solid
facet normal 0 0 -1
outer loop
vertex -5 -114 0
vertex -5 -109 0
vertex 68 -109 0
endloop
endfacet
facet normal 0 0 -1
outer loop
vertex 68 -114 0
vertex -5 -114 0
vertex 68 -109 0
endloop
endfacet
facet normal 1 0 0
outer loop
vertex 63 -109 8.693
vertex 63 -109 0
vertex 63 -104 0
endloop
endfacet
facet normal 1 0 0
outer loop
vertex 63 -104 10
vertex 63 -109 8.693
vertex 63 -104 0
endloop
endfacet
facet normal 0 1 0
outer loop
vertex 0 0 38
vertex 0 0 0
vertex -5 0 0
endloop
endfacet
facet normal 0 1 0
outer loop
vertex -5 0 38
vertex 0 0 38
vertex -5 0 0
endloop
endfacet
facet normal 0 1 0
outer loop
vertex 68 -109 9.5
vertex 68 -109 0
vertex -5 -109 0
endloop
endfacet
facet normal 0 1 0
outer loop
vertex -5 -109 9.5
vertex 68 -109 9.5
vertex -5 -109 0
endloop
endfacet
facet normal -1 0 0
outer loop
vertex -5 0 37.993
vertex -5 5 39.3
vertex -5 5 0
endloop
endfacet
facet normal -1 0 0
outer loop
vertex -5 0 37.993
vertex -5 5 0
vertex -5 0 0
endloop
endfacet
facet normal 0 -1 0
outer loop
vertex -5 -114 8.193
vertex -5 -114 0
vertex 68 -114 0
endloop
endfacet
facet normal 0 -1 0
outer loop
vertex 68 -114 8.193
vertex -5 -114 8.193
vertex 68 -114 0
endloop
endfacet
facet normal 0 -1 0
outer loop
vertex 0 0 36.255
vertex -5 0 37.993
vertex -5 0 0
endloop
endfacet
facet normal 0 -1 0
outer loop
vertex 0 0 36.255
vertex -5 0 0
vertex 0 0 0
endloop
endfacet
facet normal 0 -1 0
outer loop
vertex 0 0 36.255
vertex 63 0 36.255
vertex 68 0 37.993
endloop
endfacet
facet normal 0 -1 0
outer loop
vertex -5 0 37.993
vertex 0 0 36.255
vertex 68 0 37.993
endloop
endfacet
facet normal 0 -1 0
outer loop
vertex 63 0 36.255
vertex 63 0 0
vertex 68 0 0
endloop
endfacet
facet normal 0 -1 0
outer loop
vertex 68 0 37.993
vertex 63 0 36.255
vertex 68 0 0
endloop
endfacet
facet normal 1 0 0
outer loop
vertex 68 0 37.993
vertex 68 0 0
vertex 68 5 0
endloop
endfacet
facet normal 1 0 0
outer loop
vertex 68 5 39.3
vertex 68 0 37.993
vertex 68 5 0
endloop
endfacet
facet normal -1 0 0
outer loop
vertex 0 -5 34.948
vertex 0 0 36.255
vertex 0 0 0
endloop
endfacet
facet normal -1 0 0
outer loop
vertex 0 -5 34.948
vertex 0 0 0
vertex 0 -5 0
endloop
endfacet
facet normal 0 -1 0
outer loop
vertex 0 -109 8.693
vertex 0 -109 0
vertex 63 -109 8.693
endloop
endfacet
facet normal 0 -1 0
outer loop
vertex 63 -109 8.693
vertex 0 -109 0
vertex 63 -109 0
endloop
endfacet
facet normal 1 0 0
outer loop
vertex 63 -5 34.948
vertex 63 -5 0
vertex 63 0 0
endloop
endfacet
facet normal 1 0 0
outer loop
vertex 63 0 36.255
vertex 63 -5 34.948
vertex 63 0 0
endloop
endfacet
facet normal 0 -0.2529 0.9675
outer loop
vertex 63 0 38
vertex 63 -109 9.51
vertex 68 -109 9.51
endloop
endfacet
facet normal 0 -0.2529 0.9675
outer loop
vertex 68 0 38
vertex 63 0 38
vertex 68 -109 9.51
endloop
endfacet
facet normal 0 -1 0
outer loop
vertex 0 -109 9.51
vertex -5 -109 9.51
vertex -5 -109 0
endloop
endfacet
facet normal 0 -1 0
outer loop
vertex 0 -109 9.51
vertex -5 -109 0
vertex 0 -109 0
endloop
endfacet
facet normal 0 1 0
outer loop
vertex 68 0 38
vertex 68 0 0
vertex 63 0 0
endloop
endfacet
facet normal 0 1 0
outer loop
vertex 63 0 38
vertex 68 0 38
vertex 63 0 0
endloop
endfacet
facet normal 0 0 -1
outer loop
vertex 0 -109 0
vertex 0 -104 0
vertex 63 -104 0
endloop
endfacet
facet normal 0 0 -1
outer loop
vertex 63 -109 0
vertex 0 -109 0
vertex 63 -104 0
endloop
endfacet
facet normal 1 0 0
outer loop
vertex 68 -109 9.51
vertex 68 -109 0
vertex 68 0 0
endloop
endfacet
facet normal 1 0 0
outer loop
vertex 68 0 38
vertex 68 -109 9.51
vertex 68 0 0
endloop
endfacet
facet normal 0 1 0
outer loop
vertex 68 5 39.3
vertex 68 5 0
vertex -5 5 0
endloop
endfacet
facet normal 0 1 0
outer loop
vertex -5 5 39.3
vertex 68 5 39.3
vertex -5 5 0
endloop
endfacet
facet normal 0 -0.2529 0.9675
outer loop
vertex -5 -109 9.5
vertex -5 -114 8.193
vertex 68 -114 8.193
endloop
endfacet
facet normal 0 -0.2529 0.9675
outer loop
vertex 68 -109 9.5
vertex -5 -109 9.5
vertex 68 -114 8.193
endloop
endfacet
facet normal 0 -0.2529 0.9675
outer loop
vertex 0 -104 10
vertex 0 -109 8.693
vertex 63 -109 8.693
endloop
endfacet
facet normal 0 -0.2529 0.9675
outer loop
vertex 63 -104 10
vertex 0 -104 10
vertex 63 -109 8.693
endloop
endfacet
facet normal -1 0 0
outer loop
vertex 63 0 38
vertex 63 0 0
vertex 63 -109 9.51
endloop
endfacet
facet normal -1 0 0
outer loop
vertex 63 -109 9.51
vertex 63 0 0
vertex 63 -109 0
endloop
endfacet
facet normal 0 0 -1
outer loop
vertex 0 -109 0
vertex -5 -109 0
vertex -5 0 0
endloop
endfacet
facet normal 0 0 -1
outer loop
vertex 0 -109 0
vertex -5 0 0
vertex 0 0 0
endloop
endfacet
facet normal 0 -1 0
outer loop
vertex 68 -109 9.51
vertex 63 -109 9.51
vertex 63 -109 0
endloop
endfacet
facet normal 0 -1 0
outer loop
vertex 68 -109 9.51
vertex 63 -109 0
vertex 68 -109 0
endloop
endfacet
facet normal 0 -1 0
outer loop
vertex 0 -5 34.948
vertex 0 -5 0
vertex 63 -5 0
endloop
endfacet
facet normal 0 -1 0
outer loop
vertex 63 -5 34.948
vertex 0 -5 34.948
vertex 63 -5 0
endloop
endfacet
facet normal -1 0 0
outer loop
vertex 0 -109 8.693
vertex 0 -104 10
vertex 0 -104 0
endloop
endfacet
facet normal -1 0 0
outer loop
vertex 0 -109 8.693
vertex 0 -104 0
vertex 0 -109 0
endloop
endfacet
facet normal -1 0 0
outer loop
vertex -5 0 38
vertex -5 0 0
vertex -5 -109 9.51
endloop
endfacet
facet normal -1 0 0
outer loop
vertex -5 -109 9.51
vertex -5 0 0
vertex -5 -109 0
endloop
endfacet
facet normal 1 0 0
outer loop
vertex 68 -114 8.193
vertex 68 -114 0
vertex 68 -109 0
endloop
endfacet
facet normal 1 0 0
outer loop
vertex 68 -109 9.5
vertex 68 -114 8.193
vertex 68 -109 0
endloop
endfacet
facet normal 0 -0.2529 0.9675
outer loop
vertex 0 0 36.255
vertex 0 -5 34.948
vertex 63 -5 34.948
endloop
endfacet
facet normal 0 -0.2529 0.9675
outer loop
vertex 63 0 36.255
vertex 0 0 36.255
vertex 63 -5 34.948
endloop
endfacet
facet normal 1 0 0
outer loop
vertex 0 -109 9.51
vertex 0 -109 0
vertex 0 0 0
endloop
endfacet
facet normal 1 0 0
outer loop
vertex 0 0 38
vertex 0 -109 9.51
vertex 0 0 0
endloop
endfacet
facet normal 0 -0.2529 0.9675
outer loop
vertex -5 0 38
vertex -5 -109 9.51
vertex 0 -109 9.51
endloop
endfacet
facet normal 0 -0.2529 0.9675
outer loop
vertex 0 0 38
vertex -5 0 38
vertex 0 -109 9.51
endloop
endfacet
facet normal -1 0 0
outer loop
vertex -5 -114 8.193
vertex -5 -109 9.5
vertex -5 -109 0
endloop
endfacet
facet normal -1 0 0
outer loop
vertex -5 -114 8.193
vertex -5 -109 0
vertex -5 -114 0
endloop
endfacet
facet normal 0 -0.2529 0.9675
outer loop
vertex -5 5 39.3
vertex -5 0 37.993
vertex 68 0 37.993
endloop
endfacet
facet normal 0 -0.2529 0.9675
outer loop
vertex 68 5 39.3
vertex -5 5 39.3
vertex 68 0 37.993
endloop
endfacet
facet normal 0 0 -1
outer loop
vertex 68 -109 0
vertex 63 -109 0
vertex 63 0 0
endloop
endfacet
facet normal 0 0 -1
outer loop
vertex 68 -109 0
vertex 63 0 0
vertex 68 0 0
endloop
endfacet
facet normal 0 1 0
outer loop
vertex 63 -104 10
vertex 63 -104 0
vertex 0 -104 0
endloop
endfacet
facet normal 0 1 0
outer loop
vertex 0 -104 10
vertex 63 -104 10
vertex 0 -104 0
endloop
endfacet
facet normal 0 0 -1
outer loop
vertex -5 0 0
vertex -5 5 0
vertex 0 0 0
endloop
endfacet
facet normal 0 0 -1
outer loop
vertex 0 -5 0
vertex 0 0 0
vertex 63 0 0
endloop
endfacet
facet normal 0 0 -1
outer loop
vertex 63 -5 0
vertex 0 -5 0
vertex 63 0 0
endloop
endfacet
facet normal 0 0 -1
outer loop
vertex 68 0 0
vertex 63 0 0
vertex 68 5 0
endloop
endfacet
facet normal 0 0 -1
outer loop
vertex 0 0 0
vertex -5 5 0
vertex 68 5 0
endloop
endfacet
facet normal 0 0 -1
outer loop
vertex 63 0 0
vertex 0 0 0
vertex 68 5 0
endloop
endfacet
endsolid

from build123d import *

# Parameters (mm, degrees)
F1_DEPTH   = 36.255
F2_DEPTH   = 39.3
F3_DEPTH   = 9.5
F4_DEPTH   = 10
F5_DEPTH   = 38
F6_SIZE2   = 28.489896
F6_SIZE    = 108.99999
F7_SIZE2   = 1.306866
F7_SIZE    = 4.99999
F7_2_SIZE2 = 1.306866
F7_2_SIZE  = 4.99999
F8_SIZE2   = 1.306866
F8_SIZE    = 4.99999
F8_2_SIZE2 = 1.306866
F8_2_SIZE  = 4.99999
F9_SIZE2   = 28.489896
F9_SIZE    = 108.99999


# Not quite as in the source:
# - a fillet or chamfer is up to 0.001 mm smaller than in the source, because OpenCascade refuses the exact size


with BuildPart() as f1:
    # F0 (on Top) → F1 (new body)
    with BuildSketch(Plane.XY):
        Polygon((63, -5), (63, 0), (0, 0), (0, -5), (5, -5), (58, -5), align=None)
    extrude(amount=F1_DEPTH)

    # F0 (on Top) → F2 (join)
    with BuildSketch(Plane.XY):
        Polygon((0, 0), (63, 0), (68, 0), (68, 5), (-5, 5), (-5, 0), align=None)
    extrude(amount=F2_DEPTH)

    # F7#2 (size 5 and 1.3068764239 in the source; OpenCascade refuses exactly that, so slightly less here)
    f7_2_edges = [f1.edges().sort_by_distance(p)[0] for p in [
        (31.5, 0, 39.3),
    ]]
    f7_2_side = f1.faces().sort_by_distance((31.5, 2.5, 39.3))[0]
    chamfer(f7_2_edges, length=F7_2_SIZE, length2=F7_2_SIZE2, reference=f7_2_side)

    # F8 (size 5 and 1.3068764239 in the source; OpenCascade refuses exactly that, so slightly less here)
    f8_edges = [f1.edges().sort_by_distance(p)[0] for p in [
        (31.5, -5, 36.255),
    ]]
    f8_side = f1.faces().sort_by_distance((31.5, -2.5, 36.255))[0]
    chamfer(f8_edges, length=F8_SIZE, length2=F8_SIZE2, reference=f8_side)


with BuildPart() as f3:
    # F0 (on Top) → F3 (new body)
    with BuildSketch(Plane.XY):
        Polygon((68, -114), (68, -109), (63, -109), (0, -109), (-5, -109), (-5, -114), align=None)
    extrude(amount=F3_DEPTH)

    # F7 (size 5 and 1.3068764239 in the source; OpenCascade refuses exactly that, so slightly less here)
    f7_edges = [f3.edges().sort_by_distance(p)[0] for p in [
        (31.5, -114, 9.5),
    ]]
    f7_side = f3.faces().sort_by_distance((31.5, -111.5, 9.5))[0]
    chamfer(f7_edges, length=F7_SIZE, length2=F7_SIZE2, reference=f7_side)


with BuildPart() as f4:
    # F0 (on Top) → F4 (new body)
    with BuildSketch(Plane.XY):
        Polygon((63, -109), (63, -104), (58, -104), (5, -104), (0, -104), (0, -109), align=None)
    extrude(amount=F4_DEPTH)

    # F8#2 (size 5 and 1.3068764239 in the source; OpenCascade refuses exactly that, so slightly less here)
    f8_2_edges = [f4.edges().sort_by_distance(p)[0] for p in [
        (31.5, -109, 10),
    ]]
    f8_2_side = f4.faces().sort_by_distance((31.5, -106.5, 10))[0]
    chamfer(f8_2_edges, length=F8_2_SIZE, length2=F8_2_SIZE2, reference=f8_2_side)


with BuildPart() as f5:
    # F0 (on Top) → F5 (new body)
    with BuildSketch(Plane.XY):
        Polygon((68, 0), (63, 0), (63, -5), (63, -104), (63, -109), (68, -109), align=None)
    extrude(amount=F5_DEPTH)

    # F6 (size 109 and 28.4899060414 in the source; OpenCascade refuses exactly that, so slightly less here)
    f6_edges = [f5.edges().sort_by_distance(p)[0] for p in [
        (65.5, -109, 38),
    ]]
    f6_side = f5.faces().sort_by_distance((65.5, -54.5, 38))[0]
    chamfer(f6_edges, length=F6_SIZE, length2=F6_SIZE2, reference=f6_side)


with BuildPart() as f5b:
    # F0 (on Top) → F5, piece 2 (new body)
    with BuildSketch(Plane.XY):
        Polygon((0, -5), (0, 0), (-5, 0), (-5, -109), (0, -109), (0, -104), align=None)
    extrude(amount=F5_DEPTH)

    # F9 (size 109 and 28.4899060414 in the source; OpenCascade refuses exactly that, so slightly less here)
    f9_edges = [f5b.edges().sort_by_distance(p)[0] for p in [
        (-2.5, -109, 38),
    ]]
    f9_side = f5b.faces().sort_by_distance((-2.5, -54.5, 38))[0]
    chamfer(f9_edges, length=F9_SIZE, length2=F9_SIZE2, reference=f9_side)


solid = Compound([f1.part, f3.part, f4.part, f5.part, f5b.part])
